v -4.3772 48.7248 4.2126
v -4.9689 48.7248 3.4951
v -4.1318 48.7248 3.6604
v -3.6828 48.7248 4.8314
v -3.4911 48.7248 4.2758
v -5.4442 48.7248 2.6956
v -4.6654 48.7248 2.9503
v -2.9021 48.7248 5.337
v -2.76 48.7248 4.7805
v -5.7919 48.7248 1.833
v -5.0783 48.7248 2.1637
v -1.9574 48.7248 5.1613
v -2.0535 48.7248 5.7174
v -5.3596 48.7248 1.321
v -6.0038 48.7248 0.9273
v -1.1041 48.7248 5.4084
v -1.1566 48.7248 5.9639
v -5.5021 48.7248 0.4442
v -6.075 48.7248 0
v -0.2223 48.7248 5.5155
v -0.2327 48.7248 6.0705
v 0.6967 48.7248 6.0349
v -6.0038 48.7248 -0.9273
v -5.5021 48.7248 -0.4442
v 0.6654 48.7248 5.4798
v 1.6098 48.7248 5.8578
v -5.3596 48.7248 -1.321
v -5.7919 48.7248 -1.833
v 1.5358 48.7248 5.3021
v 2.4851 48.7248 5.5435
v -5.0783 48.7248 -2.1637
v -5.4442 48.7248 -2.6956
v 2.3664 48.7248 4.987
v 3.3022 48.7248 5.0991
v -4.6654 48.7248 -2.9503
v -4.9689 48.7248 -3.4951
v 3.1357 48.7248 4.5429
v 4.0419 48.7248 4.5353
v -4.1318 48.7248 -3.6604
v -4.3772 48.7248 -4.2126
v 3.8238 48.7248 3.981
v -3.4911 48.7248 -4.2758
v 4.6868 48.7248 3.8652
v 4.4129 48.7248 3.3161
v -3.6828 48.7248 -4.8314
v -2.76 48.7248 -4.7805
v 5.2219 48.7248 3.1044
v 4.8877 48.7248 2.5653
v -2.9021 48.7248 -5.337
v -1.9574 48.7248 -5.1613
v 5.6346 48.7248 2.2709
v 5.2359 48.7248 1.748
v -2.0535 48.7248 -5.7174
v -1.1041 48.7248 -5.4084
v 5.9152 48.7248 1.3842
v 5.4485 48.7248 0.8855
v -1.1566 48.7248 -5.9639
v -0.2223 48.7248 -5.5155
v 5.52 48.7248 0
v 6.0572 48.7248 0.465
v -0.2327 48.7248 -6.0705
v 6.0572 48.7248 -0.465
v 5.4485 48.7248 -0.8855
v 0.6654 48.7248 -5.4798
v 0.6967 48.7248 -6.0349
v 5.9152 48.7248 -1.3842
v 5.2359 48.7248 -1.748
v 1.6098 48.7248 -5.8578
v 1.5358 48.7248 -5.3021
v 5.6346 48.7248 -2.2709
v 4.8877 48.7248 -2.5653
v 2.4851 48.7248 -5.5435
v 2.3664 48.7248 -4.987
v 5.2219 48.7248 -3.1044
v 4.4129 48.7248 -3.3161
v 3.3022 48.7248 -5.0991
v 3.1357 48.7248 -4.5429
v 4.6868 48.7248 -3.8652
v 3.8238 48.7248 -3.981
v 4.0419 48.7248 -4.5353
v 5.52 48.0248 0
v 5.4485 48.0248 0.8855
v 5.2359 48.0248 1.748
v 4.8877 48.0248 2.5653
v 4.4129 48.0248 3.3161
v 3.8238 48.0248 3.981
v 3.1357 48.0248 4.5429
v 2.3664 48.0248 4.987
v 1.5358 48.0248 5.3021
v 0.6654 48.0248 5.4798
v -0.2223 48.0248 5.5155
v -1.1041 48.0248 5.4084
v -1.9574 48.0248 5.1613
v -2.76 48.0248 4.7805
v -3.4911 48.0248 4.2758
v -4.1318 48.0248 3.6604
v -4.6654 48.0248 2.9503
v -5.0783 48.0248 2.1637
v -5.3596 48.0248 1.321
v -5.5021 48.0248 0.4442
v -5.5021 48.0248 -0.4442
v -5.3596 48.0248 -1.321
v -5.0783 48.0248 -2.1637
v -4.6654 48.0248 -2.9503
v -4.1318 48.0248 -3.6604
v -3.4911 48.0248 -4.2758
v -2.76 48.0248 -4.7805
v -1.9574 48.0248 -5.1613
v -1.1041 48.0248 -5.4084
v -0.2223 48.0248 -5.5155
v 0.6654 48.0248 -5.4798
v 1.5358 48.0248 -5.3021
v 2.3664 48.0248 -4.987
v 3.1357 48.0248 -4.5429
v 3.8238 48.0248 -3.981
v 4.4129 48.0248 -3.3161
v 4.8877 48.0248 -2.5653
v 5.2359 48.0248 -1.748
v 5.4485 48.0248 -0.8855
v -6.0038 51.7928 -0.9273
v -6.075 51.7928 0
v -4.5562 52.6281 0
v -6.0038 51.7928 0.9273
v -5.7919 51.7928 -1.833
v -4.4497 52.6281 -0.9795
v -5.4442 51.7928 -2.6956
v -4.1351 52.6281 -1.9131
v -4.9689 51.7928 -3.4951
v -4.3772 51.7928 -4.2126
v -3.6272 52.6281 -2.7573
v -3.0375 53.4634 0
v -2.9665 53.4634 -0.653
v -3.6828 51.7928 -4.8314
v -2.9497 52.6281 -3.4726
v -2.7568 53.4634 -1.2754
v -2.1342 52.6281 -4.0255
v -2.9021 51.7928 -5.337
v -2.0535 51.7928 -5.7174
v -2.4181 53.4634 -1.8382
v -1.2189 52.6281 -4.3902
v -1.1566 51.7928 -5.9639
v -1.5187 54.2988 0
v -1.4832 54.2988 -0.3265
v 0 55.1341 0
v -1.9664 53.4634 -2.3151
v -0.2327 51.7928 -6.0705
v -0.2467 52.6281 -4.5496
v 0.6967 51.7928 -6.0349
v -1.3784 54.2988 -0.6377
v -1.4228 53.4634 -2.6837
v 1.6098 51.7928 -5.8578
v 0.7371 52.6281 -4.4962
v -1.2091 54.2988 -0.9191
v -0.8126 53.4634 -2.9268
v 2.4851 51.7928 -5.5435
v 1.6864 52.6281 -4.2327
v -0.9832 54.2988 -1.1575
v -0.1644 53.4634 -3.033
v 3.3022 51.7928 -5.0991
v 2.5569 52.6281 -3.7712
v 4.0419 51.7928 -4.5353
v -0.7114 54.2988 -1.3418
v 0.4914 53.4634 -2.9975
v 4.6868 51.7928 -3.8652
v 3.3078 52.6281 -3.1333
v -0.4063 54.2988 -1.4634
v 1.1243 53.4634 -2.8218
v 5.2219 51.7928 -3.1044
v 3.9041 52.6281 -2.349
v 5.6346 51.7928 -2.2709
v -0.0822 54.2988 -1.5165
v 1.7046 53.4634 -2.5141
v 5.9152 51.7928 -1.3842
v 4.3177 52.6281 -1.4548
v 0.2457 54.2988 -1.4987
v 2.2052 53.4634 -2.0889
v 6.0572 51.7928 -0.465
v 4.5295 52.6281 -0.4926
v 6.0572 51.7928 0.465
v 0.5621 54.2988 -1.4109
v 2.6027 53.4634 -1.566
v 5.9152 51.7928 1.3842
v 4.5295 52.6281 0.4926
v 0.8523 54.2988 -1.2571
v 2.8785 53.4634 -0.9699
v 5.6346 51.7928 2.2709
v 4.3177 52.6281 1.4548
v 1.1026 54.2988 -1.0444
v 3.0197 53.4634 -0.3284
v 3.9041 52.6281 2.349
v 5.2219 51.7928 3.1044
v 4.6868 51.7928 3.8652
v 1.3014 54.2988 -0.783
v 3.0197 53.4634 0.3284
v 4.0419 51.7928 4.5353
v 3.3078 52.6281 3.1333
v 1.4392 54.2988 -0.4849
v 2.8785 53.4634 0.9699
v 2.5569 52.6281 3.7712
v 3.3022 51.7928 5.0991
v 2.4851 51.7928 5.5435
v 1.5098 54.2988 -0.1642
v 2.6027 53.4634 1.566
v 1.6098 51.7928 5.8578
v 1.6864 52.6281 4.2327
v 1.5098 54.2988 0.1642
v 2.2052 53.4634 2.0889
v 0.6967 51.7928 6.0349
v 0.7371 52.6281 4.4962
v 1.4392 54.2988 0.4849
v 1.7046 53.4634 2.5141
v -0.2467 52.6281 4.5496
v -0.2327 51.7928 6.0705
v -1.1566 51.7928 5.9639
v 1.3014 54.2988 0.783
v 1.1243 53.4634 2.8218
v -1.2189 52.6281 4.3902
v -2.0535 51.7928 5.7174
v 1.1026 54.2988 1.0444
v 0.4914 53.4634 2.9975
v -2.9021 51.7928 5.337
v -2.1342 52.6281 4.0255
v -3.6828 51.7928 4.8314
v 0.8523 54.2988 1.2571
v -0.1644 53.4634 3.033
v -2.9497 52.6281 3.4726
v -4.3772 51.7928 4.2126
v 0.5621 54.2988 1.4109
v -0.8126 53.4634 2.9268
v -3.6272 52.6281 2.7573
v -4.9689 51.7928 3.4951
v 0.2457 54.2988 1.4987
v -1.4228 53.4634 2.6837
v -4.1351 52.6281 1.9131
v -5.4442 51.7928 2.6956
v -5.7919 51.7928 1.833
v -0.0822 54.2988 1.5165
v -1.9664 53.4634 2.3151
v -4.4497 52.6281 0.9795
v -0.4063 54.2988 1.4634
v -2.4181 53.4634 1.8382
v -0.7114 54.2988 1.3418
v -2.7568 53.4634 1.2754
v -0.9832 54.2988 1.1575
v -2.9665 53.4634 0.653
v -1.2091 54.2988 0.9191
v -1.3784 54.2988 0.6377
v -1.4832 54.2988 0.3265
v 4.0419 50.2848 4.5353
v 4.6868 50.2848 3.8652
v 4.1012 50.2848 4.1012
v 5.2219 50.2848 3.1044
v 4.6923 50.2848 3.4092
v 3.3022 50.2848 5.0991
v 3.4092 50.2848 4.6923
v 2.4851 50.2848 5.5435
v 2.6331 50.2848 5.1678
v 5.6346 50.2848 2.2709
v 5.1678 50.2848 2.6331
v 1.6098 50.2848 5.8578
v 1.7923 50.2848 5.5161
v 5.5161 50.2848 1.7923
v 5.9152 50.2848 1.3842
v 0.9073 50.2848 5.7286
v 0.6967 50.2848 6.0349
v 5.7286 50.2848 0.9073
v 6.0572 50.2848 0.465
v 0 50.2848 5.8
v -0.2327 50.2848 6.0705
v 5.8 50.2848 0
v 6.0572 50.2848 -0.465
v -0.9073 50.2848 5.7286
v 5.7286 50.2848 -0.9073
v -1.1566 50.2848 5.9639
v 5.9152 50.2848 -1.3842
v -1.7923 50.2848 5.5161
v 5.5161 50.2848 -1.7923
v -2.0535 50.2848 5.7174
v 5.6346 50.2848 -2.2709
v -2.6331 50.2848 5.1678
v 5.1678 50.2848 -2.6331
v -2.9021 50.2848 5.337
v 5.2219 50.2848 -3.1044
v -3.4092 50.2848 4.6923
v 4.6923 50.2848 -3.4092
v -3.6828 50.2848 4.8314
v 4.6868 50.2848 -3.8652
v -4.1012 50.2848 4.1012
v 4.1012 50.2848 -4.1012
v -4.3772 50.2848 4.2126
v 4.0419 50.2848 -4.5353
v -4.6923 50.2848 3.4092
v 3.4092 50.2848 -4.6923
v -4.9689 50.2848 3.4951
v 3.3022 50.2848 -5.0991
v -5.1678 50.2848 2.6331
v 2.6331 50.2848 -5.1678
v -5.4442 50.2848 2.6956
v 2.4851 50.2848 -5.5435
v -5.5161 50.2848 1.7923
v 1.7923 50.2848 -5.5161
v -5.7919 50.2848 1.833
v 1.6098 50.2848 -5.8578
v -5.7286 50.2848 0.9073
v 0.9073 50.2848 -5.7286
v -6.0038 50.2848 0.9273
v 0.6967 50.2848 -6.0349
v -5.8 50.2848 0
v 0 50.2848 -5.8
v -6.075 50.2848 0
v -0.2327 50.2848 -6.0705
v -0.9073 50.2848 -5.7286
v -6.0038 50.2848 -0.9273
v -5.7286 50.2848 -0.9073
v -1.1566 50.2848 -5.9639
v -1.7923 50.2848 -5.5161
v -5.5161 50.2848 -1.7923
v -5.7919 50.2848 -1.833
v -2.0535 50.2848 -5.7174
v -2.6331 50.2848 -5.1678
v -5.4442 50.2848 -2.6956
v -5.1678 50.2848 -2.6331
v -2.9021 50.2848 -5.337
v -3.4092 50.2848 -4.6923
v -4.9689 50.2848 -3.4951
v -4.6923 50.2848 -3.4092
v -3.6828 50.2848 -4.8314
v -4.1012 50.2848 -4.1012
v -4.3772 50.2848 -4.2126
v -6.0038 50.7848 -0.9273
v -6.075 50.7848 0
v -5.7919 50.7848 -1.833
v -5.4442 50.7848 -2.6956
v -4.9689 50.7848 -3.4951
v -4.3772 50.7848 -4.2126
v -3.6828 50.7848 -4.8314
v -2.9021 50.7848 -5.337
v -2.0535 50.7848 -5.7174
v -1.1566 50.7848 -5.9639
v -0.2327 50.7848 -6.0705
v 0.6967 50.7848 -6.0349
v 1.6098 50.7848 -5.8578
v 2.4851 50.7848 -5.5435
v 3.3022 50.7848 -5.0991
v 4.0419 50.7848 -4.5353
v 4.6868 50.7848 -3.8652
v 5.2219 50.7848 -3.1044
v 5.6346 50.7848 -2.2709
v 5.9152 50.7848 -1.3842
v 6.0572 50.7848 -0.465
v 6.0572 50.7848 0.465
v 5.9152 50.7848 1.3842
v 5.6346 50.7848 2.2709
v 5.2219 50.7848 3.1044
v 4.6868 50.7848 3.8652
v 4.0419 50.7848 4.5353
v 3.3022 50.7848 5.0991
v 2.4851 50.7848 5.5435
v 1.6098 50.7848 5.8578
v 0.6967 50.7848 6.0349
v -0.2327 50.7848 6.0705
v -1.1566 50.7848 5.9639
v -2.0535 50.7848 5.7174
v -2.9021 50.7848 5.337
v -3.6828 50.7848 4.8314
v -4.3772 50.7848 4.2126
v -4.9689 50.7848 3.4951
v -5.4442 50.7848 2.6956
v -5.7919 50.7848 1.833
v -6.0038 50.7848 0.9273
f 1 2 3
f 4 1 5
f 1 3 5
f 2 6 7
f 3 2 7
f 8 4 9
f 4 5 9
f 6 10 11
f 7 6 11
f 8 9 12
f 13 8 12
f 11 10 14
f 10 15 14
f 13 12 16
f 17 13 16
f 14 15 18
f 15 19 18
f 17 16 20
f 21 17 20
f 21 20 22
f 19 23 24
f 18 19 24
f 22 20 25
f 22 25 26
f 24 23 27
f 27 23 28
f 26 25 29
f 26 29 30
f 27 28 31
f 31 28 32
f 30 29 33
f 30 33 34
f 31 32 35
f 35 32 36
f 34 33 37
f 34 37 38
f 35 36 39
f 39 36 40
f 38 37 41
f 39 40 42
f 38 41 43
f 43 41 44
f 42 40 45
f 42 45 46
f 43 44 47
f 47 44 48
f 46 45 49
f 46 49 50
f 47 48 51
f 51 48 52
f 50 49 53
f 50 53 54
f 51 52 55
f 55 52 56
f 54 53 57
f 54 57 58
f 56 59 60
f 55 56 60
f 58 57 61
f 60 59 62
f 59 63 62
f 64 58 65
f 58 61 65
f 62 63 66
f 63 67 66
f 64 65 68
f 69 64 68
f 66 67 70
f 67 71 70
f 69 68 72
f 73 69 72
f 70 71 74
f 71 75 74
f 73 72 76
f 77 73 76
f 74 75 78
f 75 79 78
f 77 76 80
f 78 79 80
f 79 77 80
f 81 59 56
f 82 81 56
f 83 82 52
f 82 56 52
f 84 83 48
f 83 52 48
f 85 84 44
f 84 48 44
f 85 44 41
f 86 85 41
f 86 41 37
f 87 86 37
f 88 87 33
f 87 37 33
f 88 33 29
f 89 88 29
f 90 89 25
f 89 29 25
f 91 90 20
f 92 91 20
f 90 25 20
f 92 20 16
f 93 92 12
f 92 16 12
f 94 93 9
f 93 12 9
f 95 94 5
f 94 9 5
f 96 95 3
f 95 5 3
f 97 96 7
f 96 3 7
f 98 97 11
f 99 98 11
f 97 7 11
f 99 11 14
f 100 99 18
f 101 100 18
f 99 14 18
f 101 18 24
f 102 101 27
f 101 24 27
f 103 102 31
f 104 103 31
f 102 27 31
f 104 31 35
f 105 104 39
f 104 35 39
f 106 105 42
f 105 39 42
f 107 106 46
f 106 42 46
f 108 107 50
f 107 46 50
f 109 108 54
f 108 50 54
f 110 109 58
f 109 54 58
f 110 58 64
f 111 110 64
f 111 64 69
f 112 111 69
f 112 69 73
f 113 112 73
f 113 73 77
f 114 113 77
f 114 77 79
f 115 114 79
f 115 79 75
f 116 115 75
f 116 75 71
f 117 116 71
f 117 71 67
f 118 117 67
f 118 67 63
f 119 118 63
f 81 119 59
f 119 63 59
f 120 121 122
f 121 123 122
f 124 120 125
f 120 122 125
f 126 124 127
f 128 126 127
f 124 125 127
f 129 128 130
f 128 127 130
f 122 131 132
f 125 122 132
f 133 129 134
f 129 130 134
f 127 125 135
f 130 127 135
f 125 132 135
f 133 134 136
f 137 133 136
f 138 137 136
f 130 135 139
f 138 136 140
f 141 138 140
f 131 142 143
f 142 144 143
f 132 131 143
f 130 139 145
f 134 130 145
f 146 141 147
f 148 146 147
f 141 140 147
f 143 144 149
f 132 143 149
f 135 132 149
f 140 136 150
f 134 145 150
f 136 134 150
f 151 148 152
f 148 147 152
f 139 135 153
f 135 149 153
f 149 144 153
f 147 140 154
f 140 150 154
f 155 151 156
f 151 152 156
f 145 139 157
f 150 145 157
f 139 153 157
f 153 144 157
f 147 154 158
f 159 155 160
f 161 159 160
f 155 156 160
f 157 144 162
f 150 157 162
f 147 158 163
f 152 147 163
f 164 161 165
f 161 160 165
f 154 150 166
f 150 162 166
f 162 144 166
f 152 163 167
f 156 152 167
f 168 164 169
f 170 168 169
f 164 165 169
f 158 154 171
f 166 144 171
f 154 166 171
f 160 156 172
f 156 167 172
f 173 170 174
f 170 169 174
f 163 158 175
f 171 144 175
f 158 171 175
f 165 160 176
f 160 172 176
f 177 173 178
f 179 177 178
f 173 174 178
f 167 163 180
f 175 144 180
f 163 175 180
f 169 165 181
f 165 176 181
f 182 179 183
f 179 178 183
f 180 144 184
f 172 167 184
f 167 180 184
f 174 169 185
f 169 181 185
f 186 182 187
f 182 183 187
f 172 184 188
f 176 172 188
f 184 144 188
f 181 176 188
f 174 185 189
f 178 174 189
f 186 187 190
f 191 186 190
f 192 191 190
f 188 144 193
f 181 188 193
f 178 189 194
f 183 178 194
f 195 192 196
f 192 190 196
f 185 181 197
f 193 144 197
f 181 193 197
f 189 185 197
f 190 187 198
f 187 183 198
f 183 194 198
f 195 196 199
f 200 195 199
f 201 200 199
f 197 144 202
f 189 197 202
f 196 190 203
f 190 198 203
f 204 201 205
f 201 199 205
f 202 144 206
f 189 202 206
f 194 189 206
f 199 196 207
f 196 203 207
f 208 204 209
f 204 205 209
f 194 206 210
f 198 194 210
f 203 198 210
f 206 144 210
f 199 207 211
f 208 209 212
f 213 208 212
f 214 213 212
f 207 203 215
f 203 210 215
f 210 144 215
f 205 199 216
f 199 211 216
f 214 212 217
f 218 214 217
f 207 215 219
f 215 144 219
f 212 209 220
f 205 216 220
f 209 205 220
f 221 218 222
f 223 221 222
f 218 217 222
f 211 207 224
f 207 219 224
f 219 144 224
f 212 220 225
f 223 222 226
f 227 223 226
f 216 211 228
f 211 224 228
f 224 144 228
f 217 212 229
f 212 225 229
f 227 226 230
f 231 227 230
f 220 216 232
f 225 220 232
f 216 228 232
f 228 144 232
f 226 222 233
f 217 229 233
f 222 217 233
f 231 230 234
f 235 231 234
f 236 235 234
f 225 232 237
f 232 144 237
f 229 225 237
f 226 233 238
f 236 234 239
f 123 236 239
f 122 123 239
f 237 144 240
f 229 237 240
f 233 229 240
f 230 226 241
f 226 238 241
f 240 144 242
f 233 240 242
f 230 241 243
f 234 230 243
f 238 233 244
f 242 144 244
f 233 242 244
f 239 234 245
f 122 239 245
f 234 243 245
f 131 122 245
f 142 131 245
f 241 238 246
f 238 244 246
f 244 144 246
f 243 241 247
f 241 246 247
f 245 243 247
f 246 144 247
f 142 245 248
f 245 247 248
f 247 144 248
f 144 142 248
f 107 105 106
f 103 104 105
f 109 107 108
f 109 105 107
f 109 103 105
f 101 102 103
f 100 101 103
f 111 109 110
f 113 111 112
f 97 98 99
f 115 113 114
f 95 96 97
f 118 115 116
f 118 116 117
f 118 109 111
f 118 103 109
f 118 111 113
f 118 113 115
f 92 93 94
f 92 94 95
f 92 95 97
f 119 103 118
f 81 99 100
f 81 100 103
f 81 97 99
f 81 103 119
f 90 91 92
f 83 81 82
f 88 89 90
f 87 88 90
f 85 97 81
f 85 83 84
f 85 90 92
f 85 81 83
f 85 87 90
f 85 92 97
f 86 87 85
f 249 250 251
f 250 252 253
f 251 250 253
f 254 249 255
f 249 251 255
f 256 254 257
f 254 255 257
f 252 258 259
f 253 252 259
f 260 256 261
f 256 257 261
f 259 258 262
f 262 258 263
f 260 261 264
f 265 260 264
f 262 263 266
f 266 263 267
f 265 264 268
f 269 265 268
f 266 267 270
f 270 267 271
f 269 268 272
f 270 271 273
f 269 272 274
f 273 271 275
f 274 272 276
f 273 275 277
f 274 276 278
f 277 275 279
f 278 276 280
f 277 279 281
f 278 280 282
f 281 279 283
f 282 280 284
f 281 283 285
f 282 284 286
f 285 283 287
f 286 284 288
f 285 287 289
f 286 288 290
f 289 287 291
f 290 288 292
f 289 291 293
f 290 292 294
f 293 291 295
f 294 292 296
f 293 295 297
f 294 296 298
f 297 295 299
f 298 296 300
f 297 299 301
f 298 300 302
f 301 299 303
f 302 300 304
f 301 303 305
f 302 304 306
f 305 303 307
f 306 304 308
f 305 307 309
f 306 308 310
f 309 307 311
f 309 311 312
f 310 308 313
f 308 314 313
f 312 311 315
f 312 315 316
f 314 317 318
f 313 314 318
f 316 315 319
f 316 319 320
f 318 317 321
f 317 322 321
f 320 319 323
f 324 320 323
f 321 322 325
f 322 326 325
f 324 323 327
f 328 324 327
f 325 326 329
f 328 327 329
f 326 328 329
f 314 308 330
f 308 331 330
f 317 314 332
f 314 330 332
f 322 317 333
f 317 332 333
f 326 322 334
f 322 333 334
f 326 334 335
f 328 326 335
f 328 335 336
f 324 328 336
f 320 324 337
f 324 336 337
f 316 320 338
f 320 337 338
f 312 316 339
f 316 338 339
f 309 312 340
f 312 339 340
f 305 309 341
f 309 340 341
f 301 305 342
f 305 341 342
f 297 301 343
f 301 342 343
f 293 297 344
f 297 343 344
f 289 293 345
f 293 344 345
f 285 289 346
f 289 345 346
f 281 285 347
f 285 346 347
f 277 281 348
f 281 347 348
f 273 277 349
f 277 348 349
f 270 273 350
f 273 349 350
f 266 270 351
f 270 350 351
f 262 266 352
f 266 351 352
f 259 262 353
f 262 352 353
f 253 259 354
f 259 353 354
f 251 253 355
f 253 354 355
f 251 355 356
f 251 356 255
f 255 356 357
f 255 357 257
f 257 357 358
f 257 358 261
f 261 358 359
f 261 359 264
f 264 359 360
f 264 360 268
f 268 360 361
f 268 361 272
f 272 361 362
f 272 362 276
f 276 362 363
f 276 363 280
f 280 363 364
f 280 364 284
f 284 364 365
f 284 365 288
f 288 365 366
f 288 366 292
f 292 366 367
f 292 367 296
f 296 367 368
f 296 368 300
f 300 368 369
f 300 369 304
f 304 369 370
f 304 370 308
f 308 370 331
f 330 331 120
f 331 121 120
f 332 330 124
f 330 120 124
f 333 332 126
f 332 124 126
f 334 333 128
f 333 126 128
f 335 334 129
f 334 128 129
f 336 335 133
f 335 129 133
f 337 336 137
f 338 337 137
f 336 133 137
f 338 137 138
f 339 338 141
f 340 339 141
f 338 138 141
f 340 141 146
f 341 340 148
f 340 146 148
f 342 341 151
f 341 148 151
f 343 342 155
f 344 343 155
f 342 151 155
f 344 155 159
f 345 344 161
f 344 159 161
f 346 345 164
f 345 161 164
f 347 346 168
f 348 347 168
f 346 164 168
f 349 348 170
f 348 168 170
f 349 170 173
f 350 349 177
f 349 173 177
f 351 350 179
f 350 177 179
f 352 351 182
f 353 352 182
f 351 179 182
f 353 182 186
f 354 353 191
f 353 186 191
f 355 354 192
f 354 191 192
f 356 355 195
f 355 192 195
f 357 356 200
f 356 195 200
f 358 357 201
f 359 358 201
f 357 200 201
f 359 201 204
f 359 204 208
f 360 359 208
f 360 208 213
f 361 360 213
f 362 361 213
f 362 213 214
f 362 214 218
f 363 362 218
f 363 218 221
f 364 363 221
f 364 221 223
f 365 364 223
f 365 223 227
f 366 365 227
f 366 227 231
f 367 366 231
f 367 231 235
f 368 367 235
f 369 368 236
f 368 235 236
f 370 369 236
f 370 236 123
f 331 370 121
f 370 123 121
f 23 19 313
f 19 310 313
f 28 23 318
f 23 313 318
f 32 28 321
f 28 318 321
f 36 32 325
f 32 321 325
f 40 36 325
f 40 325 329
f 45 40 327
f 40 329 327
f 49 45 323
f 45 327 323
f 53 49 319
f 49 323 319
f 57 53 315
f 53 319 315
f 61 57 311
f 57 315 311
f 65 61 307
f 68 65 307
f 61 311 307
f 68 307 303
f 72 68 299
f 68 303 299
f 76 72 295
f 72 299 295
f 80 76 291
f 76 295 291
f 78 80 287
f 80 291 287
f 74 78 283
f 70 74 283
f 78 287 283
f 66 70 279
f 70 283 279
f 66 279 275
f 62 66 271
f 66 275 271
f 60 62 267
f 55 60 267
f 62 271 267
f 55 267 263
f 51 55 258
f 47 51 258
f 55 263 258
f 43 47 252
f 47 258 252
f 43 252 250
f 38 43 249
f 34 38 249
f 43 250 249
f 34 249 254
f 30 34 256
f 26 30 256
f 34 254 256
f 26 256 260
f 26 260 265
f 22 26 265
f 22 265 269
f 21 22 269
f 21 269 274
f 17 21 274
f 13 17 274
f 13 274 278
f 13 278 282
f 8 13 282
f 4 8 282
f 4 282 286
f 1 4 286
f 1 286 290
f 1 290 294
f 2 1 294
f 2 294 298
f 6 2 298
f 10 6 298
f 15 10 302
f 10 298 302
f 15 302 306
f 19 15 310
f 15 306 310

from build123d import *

# Parameters (mm, degrees)
SKETCH8_R           = 5.52
BOSS_EXTRUDE2_DEPTH = 0.7


with BuildPart() as part:
    # Sketch7 → Revolve1 (revolve)
    with BuildSketch(Plane.XY):
        Polygon((0, 55.134065354), (0, 48.724836522), (-6.075, 48.724836522), (-6.075, 50.284836522), (-5.8, 50.284836522), (-6.075, 50.784836522), (-6.075, 51.792815354), align=None)
    revolve(axis=Axis((0, 55.134065354, 0), (0, -1, 0)))

    # Sketch8 → Boss-Extrude2 (add)
    with BuildSketch(Plane.XZ.offset(-48.724836522)):
        Circle(SKETCH8_R)
    extrude(amount=BOSS_EXTRUDE2_DEPTH)


solid = part.part
